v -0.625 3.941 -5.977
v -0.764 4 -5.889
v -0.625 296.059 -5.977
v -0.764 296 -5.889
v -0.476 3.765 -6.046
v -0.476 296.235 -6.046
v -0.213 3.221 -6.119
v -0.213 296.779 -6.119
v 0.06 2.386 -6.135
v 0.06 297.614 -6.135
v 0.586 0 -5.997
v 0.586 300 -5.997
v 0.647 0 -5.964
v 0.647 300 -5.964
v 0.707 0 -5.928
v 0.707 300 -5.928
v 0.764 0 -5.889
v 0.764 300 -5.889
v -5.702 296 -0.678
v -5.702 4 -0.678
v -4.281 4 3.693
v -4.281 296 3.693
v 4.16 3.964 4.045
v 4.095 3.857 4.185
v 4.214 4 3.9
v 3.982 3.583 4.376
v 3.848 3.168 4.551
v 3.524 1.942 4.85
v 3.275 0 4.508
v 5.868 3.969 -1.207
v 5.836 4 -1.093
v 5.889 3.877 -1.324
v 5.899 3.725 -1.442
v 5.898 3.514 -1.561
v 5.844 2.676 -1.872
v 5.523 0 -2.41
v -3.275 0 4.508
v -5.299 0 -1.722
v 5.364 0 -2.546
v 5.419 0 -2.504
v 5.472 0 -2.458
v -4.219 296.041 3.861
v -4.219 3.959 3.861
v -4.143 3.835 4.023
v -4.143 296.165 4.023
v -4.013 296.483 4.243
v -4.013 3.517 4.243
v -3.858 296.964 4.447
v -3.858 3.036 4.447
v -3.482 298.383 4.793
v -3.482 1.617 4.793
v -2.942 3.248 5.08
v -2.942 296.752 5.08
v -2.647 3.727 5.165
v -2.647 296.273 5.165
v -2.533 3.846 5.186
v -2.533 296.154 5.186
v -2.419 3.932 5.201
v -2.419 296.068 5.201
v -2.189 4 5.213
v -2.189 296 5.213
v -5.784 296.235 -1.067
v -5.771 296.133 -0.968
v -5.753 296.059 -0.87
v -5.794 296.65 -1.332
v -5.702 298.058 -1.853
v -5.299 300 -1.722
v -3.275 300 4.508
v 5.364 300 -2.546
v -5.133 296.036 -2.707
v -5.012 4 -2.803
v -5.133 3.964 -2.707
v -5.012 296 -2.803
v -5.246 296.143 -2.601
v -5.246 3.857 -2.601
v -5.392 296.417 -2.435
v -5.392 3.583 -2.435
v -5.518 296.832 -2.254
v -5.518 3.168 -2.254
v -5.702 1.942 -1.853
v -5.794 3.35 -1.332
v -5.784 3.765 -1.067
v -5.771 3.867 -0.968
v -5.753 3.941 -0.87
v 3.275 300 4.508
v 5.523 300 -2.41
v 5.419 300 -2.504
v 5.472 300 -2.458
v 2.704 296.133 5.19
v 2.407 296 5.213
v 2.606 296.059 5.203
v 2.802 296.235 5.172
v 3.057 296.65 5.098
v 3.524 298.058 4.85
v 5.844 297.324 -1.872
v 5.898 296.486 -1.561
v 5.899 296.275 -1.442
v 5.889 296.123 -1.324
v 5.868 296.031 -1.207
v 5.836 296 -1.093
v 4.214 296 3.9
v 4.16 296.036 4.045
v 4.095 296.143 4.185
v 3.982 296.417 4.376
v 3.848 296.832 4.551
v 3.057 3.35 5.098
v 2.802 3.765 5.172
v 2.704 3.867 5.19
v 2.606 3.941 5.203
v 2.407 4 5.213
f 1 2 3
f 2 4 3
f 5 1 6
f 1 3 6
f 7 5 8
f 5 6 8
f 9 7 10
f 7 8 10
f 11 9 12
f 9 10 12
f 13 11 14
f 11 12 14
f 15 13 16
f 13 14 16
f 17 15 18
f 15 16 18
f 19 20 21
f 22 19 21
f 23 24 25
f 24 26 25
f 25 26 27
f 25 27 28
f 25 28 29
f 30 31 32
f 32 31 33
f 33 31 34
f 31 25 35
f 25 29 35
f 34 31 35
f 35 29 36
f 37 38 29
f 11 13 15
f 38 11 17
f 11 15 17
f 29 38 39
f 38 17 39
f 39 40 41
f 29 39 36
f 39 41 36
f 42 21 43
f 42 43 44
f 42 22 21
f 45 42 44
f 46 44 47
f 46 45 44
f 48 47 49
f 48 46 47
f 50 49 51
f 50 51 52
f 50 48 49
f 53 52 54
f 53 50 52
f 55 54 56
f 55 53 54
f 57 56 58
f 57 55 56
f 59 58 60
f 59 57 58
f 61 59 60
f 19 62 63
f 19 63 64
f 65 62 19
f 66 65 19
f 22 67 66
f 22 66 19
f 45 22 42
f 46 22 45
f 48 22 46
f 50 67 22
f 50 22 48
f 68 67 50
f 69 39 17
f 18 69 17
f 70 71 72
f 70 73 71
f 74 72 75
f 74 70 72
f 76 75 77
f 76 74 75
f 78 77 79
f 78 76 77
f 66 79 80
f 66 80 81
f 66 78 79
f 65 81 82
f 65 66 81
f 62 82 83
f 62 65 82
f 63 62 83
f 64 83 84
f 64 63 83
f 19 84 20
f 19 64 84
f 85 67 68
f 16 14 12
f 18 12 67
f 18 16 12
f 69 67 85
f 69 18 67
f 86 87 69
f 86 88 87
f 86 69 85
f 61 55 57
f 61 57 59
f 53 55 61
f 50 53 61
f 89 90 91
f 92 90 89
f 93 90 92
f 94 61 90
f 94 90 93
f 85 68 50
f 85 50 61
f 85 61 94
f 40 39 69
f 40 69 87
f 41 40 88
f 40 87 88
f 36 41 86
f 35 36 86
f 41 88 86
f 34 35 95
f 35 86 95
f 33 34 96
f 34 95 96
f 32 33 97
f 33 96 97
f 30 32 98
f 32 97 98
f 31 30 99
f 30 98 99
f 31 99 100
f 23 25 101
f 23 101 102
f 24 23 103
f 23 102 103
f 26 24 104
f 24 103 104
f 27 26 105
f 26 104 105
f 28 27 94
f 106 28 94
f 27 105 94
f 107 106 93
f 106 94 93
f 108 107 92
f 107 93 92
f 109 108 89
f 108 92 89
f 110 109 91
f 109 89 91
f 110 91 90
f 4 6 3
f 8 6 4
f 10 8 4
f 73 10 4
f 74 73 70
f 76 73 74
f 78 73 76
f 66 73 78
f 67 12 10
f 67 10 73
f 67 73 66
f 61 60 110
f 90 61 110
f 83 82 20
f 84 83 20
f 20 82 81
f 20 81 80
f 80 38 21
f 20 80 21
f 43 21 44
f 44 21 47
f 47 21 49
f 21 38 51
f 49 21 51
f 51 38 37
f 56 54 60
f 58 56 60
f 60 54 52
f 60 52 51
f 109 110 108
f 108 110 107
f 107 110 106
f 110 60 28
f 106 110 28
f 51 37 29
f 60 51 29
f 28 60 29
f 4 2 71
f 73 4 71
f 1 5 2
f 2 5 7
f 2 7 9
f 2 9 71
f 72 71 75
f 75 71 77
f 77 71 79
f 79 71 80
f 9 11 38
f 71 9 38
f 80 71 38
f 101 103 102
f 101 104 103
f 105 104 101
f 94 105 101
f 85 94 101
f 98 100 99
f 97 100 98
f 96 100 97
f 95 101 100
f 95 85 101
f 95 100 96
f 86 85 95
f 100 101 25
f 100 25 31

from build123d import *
from OCP.BRepFilletAPI import BRepFilletAPI_MakeChamfer

# Parameters (mm, degrees)
BOSS_EXTRUDE1_DEPTH = 300
CHAMFER1_SIZE       = 4
CHAMFER1_SIZE2      = 0.705307923
FILLET2_R           = 1.9
FILLET3_R           = 1.3
FILLET4_R           = 2.2


with BuildPart() as part:
    # Sketch1 → Boss-Extrude1 (new body)
    with BuildSketch(Plane(origin=(0, 0, 0), x_dir=(1, 0, 0), z_dir=(0, 1, 0))):
        Polygon((0, 6.443679873), (-6.128303732, 1.991206587), (-3.7875, -5.213046524), (3.7875, -5.213046524), (6.128303732, 1.991206587), align=None)
    extrude(amount=BOSS_EXTRUDE1_DEPTH)

    # Chamfer1: one chamfer whose edges measure the first distance from different faces: ONE call of the kernel's chamfer builder (chamfer() names one face for all edges)
    chamfer1_edges_1 = [part.edges().sort_by_distance(p)[0] for p in [
        (-4.957901866, 300, 1.610919968),
        (-4.957901866, 0, 1.610919968),
    ]]
    chamfer1_side_1 = [part.faces().sort_by_distance(p)[0] for p in [
        (-4.957901866, 150, 1.610919968),
    ]]
    chamfer1_edges_2 = [part.edges().sort_by_distance(p)[0] for p in [
        (0, 300, 5.213046524),
        (0, 0, 5.213046524),
    ]]
    chamfer1_side_2 = [part.faces().sort_by_distance(p)[0] for p in [
        (0, 150, 5.213046524),
    ]]
    chamfer1_edges_3 = [part.edges().sort_by_distance(p)[0] for p in [
        (4.957901866, 300, 1.610919968),
        (4.957901866, 0, 1.610919968),
    ]]
    chamfer1_side_3 = [part.faces().sort_by_distance(p)[0] for p in [
        (4.957901866, 150, 1.610919968),
    ]]
    chamfer1_edges_4 = [part.edges().sort_by_distance(p)[0] for p in [
        (-3.064151866, 0, -4.21744323),
        (-3.064151866, 300, -4.21744323),
    ]]
    chamfer1_side_4 = [part.faces().sort_by_distance(p)[0] for p in [
        (-3.064151866, 150, -4.21744323),
    ]]
    chamfer1 = BRepFilletAPI_MakeChamfer(part.part.solid().wrapped)
    for e in chamfer1_edges_1:
        chamfer1.Add(CHAMFER1_SIZE, CHAMFER1_SIZE2, e.wrapped, chamfer1_side_1[0].wrapped)  # the first distance lies on this face
    for e in chamfer1_edges_2:
        chamfer1.Add(CHAMFER1_SIZE, CHAMFER1_SIZE2, e.wrapped, chamfer1_side_2[0].wrapped)  # the first distance lies on this face
    for e in chamfer1_edges_3:
        chamfer1.Add(CHAMFER1_SIZE, CHAMFER1_SIZE2, e.wrapped, chamfer1_side_3[0].wrapped)  # the first distance lies on this face
    for e in chamfer1_edges_4:
        chamfer1.Add(CHAMFER1_SIZE, CHAMFER1_SIZE2, e.wrapped, chamfer1_side_4[0].wrapped)  # the first distance lies on this face
    add(Compound.cast(chamfer1.Shape()), mode=Mode.REPLACE)

    # Fillet2
    fillet2_edges = [part.edges().sort_by_distance(p)[0] for p in [
        (3.7875, 150, 5.213046524),
        (-6.128303732, 150, -1.991206587),
    ]]
    fillet(fillet2_edges, radius=FILLET2_R)

    # Fillet3
    fillet3_edges = [part.edges().sort_by_distance(p)[0] for p in [
        (6.128303732, 150, -1.991206587),
        (0, 150, -6.443679873),
    ]]
    fillet(fillet3_edges, radius=FILLET3_R)

    # Fillet4
    fillet4_edges = [part.edges().sort_by_distance(p)[0] for p in [
        (-3.7875, 150, 5.213046524),
    ]]
    fillet(fillet4_edges, radius=FILLET4_R)


solid = part.part
